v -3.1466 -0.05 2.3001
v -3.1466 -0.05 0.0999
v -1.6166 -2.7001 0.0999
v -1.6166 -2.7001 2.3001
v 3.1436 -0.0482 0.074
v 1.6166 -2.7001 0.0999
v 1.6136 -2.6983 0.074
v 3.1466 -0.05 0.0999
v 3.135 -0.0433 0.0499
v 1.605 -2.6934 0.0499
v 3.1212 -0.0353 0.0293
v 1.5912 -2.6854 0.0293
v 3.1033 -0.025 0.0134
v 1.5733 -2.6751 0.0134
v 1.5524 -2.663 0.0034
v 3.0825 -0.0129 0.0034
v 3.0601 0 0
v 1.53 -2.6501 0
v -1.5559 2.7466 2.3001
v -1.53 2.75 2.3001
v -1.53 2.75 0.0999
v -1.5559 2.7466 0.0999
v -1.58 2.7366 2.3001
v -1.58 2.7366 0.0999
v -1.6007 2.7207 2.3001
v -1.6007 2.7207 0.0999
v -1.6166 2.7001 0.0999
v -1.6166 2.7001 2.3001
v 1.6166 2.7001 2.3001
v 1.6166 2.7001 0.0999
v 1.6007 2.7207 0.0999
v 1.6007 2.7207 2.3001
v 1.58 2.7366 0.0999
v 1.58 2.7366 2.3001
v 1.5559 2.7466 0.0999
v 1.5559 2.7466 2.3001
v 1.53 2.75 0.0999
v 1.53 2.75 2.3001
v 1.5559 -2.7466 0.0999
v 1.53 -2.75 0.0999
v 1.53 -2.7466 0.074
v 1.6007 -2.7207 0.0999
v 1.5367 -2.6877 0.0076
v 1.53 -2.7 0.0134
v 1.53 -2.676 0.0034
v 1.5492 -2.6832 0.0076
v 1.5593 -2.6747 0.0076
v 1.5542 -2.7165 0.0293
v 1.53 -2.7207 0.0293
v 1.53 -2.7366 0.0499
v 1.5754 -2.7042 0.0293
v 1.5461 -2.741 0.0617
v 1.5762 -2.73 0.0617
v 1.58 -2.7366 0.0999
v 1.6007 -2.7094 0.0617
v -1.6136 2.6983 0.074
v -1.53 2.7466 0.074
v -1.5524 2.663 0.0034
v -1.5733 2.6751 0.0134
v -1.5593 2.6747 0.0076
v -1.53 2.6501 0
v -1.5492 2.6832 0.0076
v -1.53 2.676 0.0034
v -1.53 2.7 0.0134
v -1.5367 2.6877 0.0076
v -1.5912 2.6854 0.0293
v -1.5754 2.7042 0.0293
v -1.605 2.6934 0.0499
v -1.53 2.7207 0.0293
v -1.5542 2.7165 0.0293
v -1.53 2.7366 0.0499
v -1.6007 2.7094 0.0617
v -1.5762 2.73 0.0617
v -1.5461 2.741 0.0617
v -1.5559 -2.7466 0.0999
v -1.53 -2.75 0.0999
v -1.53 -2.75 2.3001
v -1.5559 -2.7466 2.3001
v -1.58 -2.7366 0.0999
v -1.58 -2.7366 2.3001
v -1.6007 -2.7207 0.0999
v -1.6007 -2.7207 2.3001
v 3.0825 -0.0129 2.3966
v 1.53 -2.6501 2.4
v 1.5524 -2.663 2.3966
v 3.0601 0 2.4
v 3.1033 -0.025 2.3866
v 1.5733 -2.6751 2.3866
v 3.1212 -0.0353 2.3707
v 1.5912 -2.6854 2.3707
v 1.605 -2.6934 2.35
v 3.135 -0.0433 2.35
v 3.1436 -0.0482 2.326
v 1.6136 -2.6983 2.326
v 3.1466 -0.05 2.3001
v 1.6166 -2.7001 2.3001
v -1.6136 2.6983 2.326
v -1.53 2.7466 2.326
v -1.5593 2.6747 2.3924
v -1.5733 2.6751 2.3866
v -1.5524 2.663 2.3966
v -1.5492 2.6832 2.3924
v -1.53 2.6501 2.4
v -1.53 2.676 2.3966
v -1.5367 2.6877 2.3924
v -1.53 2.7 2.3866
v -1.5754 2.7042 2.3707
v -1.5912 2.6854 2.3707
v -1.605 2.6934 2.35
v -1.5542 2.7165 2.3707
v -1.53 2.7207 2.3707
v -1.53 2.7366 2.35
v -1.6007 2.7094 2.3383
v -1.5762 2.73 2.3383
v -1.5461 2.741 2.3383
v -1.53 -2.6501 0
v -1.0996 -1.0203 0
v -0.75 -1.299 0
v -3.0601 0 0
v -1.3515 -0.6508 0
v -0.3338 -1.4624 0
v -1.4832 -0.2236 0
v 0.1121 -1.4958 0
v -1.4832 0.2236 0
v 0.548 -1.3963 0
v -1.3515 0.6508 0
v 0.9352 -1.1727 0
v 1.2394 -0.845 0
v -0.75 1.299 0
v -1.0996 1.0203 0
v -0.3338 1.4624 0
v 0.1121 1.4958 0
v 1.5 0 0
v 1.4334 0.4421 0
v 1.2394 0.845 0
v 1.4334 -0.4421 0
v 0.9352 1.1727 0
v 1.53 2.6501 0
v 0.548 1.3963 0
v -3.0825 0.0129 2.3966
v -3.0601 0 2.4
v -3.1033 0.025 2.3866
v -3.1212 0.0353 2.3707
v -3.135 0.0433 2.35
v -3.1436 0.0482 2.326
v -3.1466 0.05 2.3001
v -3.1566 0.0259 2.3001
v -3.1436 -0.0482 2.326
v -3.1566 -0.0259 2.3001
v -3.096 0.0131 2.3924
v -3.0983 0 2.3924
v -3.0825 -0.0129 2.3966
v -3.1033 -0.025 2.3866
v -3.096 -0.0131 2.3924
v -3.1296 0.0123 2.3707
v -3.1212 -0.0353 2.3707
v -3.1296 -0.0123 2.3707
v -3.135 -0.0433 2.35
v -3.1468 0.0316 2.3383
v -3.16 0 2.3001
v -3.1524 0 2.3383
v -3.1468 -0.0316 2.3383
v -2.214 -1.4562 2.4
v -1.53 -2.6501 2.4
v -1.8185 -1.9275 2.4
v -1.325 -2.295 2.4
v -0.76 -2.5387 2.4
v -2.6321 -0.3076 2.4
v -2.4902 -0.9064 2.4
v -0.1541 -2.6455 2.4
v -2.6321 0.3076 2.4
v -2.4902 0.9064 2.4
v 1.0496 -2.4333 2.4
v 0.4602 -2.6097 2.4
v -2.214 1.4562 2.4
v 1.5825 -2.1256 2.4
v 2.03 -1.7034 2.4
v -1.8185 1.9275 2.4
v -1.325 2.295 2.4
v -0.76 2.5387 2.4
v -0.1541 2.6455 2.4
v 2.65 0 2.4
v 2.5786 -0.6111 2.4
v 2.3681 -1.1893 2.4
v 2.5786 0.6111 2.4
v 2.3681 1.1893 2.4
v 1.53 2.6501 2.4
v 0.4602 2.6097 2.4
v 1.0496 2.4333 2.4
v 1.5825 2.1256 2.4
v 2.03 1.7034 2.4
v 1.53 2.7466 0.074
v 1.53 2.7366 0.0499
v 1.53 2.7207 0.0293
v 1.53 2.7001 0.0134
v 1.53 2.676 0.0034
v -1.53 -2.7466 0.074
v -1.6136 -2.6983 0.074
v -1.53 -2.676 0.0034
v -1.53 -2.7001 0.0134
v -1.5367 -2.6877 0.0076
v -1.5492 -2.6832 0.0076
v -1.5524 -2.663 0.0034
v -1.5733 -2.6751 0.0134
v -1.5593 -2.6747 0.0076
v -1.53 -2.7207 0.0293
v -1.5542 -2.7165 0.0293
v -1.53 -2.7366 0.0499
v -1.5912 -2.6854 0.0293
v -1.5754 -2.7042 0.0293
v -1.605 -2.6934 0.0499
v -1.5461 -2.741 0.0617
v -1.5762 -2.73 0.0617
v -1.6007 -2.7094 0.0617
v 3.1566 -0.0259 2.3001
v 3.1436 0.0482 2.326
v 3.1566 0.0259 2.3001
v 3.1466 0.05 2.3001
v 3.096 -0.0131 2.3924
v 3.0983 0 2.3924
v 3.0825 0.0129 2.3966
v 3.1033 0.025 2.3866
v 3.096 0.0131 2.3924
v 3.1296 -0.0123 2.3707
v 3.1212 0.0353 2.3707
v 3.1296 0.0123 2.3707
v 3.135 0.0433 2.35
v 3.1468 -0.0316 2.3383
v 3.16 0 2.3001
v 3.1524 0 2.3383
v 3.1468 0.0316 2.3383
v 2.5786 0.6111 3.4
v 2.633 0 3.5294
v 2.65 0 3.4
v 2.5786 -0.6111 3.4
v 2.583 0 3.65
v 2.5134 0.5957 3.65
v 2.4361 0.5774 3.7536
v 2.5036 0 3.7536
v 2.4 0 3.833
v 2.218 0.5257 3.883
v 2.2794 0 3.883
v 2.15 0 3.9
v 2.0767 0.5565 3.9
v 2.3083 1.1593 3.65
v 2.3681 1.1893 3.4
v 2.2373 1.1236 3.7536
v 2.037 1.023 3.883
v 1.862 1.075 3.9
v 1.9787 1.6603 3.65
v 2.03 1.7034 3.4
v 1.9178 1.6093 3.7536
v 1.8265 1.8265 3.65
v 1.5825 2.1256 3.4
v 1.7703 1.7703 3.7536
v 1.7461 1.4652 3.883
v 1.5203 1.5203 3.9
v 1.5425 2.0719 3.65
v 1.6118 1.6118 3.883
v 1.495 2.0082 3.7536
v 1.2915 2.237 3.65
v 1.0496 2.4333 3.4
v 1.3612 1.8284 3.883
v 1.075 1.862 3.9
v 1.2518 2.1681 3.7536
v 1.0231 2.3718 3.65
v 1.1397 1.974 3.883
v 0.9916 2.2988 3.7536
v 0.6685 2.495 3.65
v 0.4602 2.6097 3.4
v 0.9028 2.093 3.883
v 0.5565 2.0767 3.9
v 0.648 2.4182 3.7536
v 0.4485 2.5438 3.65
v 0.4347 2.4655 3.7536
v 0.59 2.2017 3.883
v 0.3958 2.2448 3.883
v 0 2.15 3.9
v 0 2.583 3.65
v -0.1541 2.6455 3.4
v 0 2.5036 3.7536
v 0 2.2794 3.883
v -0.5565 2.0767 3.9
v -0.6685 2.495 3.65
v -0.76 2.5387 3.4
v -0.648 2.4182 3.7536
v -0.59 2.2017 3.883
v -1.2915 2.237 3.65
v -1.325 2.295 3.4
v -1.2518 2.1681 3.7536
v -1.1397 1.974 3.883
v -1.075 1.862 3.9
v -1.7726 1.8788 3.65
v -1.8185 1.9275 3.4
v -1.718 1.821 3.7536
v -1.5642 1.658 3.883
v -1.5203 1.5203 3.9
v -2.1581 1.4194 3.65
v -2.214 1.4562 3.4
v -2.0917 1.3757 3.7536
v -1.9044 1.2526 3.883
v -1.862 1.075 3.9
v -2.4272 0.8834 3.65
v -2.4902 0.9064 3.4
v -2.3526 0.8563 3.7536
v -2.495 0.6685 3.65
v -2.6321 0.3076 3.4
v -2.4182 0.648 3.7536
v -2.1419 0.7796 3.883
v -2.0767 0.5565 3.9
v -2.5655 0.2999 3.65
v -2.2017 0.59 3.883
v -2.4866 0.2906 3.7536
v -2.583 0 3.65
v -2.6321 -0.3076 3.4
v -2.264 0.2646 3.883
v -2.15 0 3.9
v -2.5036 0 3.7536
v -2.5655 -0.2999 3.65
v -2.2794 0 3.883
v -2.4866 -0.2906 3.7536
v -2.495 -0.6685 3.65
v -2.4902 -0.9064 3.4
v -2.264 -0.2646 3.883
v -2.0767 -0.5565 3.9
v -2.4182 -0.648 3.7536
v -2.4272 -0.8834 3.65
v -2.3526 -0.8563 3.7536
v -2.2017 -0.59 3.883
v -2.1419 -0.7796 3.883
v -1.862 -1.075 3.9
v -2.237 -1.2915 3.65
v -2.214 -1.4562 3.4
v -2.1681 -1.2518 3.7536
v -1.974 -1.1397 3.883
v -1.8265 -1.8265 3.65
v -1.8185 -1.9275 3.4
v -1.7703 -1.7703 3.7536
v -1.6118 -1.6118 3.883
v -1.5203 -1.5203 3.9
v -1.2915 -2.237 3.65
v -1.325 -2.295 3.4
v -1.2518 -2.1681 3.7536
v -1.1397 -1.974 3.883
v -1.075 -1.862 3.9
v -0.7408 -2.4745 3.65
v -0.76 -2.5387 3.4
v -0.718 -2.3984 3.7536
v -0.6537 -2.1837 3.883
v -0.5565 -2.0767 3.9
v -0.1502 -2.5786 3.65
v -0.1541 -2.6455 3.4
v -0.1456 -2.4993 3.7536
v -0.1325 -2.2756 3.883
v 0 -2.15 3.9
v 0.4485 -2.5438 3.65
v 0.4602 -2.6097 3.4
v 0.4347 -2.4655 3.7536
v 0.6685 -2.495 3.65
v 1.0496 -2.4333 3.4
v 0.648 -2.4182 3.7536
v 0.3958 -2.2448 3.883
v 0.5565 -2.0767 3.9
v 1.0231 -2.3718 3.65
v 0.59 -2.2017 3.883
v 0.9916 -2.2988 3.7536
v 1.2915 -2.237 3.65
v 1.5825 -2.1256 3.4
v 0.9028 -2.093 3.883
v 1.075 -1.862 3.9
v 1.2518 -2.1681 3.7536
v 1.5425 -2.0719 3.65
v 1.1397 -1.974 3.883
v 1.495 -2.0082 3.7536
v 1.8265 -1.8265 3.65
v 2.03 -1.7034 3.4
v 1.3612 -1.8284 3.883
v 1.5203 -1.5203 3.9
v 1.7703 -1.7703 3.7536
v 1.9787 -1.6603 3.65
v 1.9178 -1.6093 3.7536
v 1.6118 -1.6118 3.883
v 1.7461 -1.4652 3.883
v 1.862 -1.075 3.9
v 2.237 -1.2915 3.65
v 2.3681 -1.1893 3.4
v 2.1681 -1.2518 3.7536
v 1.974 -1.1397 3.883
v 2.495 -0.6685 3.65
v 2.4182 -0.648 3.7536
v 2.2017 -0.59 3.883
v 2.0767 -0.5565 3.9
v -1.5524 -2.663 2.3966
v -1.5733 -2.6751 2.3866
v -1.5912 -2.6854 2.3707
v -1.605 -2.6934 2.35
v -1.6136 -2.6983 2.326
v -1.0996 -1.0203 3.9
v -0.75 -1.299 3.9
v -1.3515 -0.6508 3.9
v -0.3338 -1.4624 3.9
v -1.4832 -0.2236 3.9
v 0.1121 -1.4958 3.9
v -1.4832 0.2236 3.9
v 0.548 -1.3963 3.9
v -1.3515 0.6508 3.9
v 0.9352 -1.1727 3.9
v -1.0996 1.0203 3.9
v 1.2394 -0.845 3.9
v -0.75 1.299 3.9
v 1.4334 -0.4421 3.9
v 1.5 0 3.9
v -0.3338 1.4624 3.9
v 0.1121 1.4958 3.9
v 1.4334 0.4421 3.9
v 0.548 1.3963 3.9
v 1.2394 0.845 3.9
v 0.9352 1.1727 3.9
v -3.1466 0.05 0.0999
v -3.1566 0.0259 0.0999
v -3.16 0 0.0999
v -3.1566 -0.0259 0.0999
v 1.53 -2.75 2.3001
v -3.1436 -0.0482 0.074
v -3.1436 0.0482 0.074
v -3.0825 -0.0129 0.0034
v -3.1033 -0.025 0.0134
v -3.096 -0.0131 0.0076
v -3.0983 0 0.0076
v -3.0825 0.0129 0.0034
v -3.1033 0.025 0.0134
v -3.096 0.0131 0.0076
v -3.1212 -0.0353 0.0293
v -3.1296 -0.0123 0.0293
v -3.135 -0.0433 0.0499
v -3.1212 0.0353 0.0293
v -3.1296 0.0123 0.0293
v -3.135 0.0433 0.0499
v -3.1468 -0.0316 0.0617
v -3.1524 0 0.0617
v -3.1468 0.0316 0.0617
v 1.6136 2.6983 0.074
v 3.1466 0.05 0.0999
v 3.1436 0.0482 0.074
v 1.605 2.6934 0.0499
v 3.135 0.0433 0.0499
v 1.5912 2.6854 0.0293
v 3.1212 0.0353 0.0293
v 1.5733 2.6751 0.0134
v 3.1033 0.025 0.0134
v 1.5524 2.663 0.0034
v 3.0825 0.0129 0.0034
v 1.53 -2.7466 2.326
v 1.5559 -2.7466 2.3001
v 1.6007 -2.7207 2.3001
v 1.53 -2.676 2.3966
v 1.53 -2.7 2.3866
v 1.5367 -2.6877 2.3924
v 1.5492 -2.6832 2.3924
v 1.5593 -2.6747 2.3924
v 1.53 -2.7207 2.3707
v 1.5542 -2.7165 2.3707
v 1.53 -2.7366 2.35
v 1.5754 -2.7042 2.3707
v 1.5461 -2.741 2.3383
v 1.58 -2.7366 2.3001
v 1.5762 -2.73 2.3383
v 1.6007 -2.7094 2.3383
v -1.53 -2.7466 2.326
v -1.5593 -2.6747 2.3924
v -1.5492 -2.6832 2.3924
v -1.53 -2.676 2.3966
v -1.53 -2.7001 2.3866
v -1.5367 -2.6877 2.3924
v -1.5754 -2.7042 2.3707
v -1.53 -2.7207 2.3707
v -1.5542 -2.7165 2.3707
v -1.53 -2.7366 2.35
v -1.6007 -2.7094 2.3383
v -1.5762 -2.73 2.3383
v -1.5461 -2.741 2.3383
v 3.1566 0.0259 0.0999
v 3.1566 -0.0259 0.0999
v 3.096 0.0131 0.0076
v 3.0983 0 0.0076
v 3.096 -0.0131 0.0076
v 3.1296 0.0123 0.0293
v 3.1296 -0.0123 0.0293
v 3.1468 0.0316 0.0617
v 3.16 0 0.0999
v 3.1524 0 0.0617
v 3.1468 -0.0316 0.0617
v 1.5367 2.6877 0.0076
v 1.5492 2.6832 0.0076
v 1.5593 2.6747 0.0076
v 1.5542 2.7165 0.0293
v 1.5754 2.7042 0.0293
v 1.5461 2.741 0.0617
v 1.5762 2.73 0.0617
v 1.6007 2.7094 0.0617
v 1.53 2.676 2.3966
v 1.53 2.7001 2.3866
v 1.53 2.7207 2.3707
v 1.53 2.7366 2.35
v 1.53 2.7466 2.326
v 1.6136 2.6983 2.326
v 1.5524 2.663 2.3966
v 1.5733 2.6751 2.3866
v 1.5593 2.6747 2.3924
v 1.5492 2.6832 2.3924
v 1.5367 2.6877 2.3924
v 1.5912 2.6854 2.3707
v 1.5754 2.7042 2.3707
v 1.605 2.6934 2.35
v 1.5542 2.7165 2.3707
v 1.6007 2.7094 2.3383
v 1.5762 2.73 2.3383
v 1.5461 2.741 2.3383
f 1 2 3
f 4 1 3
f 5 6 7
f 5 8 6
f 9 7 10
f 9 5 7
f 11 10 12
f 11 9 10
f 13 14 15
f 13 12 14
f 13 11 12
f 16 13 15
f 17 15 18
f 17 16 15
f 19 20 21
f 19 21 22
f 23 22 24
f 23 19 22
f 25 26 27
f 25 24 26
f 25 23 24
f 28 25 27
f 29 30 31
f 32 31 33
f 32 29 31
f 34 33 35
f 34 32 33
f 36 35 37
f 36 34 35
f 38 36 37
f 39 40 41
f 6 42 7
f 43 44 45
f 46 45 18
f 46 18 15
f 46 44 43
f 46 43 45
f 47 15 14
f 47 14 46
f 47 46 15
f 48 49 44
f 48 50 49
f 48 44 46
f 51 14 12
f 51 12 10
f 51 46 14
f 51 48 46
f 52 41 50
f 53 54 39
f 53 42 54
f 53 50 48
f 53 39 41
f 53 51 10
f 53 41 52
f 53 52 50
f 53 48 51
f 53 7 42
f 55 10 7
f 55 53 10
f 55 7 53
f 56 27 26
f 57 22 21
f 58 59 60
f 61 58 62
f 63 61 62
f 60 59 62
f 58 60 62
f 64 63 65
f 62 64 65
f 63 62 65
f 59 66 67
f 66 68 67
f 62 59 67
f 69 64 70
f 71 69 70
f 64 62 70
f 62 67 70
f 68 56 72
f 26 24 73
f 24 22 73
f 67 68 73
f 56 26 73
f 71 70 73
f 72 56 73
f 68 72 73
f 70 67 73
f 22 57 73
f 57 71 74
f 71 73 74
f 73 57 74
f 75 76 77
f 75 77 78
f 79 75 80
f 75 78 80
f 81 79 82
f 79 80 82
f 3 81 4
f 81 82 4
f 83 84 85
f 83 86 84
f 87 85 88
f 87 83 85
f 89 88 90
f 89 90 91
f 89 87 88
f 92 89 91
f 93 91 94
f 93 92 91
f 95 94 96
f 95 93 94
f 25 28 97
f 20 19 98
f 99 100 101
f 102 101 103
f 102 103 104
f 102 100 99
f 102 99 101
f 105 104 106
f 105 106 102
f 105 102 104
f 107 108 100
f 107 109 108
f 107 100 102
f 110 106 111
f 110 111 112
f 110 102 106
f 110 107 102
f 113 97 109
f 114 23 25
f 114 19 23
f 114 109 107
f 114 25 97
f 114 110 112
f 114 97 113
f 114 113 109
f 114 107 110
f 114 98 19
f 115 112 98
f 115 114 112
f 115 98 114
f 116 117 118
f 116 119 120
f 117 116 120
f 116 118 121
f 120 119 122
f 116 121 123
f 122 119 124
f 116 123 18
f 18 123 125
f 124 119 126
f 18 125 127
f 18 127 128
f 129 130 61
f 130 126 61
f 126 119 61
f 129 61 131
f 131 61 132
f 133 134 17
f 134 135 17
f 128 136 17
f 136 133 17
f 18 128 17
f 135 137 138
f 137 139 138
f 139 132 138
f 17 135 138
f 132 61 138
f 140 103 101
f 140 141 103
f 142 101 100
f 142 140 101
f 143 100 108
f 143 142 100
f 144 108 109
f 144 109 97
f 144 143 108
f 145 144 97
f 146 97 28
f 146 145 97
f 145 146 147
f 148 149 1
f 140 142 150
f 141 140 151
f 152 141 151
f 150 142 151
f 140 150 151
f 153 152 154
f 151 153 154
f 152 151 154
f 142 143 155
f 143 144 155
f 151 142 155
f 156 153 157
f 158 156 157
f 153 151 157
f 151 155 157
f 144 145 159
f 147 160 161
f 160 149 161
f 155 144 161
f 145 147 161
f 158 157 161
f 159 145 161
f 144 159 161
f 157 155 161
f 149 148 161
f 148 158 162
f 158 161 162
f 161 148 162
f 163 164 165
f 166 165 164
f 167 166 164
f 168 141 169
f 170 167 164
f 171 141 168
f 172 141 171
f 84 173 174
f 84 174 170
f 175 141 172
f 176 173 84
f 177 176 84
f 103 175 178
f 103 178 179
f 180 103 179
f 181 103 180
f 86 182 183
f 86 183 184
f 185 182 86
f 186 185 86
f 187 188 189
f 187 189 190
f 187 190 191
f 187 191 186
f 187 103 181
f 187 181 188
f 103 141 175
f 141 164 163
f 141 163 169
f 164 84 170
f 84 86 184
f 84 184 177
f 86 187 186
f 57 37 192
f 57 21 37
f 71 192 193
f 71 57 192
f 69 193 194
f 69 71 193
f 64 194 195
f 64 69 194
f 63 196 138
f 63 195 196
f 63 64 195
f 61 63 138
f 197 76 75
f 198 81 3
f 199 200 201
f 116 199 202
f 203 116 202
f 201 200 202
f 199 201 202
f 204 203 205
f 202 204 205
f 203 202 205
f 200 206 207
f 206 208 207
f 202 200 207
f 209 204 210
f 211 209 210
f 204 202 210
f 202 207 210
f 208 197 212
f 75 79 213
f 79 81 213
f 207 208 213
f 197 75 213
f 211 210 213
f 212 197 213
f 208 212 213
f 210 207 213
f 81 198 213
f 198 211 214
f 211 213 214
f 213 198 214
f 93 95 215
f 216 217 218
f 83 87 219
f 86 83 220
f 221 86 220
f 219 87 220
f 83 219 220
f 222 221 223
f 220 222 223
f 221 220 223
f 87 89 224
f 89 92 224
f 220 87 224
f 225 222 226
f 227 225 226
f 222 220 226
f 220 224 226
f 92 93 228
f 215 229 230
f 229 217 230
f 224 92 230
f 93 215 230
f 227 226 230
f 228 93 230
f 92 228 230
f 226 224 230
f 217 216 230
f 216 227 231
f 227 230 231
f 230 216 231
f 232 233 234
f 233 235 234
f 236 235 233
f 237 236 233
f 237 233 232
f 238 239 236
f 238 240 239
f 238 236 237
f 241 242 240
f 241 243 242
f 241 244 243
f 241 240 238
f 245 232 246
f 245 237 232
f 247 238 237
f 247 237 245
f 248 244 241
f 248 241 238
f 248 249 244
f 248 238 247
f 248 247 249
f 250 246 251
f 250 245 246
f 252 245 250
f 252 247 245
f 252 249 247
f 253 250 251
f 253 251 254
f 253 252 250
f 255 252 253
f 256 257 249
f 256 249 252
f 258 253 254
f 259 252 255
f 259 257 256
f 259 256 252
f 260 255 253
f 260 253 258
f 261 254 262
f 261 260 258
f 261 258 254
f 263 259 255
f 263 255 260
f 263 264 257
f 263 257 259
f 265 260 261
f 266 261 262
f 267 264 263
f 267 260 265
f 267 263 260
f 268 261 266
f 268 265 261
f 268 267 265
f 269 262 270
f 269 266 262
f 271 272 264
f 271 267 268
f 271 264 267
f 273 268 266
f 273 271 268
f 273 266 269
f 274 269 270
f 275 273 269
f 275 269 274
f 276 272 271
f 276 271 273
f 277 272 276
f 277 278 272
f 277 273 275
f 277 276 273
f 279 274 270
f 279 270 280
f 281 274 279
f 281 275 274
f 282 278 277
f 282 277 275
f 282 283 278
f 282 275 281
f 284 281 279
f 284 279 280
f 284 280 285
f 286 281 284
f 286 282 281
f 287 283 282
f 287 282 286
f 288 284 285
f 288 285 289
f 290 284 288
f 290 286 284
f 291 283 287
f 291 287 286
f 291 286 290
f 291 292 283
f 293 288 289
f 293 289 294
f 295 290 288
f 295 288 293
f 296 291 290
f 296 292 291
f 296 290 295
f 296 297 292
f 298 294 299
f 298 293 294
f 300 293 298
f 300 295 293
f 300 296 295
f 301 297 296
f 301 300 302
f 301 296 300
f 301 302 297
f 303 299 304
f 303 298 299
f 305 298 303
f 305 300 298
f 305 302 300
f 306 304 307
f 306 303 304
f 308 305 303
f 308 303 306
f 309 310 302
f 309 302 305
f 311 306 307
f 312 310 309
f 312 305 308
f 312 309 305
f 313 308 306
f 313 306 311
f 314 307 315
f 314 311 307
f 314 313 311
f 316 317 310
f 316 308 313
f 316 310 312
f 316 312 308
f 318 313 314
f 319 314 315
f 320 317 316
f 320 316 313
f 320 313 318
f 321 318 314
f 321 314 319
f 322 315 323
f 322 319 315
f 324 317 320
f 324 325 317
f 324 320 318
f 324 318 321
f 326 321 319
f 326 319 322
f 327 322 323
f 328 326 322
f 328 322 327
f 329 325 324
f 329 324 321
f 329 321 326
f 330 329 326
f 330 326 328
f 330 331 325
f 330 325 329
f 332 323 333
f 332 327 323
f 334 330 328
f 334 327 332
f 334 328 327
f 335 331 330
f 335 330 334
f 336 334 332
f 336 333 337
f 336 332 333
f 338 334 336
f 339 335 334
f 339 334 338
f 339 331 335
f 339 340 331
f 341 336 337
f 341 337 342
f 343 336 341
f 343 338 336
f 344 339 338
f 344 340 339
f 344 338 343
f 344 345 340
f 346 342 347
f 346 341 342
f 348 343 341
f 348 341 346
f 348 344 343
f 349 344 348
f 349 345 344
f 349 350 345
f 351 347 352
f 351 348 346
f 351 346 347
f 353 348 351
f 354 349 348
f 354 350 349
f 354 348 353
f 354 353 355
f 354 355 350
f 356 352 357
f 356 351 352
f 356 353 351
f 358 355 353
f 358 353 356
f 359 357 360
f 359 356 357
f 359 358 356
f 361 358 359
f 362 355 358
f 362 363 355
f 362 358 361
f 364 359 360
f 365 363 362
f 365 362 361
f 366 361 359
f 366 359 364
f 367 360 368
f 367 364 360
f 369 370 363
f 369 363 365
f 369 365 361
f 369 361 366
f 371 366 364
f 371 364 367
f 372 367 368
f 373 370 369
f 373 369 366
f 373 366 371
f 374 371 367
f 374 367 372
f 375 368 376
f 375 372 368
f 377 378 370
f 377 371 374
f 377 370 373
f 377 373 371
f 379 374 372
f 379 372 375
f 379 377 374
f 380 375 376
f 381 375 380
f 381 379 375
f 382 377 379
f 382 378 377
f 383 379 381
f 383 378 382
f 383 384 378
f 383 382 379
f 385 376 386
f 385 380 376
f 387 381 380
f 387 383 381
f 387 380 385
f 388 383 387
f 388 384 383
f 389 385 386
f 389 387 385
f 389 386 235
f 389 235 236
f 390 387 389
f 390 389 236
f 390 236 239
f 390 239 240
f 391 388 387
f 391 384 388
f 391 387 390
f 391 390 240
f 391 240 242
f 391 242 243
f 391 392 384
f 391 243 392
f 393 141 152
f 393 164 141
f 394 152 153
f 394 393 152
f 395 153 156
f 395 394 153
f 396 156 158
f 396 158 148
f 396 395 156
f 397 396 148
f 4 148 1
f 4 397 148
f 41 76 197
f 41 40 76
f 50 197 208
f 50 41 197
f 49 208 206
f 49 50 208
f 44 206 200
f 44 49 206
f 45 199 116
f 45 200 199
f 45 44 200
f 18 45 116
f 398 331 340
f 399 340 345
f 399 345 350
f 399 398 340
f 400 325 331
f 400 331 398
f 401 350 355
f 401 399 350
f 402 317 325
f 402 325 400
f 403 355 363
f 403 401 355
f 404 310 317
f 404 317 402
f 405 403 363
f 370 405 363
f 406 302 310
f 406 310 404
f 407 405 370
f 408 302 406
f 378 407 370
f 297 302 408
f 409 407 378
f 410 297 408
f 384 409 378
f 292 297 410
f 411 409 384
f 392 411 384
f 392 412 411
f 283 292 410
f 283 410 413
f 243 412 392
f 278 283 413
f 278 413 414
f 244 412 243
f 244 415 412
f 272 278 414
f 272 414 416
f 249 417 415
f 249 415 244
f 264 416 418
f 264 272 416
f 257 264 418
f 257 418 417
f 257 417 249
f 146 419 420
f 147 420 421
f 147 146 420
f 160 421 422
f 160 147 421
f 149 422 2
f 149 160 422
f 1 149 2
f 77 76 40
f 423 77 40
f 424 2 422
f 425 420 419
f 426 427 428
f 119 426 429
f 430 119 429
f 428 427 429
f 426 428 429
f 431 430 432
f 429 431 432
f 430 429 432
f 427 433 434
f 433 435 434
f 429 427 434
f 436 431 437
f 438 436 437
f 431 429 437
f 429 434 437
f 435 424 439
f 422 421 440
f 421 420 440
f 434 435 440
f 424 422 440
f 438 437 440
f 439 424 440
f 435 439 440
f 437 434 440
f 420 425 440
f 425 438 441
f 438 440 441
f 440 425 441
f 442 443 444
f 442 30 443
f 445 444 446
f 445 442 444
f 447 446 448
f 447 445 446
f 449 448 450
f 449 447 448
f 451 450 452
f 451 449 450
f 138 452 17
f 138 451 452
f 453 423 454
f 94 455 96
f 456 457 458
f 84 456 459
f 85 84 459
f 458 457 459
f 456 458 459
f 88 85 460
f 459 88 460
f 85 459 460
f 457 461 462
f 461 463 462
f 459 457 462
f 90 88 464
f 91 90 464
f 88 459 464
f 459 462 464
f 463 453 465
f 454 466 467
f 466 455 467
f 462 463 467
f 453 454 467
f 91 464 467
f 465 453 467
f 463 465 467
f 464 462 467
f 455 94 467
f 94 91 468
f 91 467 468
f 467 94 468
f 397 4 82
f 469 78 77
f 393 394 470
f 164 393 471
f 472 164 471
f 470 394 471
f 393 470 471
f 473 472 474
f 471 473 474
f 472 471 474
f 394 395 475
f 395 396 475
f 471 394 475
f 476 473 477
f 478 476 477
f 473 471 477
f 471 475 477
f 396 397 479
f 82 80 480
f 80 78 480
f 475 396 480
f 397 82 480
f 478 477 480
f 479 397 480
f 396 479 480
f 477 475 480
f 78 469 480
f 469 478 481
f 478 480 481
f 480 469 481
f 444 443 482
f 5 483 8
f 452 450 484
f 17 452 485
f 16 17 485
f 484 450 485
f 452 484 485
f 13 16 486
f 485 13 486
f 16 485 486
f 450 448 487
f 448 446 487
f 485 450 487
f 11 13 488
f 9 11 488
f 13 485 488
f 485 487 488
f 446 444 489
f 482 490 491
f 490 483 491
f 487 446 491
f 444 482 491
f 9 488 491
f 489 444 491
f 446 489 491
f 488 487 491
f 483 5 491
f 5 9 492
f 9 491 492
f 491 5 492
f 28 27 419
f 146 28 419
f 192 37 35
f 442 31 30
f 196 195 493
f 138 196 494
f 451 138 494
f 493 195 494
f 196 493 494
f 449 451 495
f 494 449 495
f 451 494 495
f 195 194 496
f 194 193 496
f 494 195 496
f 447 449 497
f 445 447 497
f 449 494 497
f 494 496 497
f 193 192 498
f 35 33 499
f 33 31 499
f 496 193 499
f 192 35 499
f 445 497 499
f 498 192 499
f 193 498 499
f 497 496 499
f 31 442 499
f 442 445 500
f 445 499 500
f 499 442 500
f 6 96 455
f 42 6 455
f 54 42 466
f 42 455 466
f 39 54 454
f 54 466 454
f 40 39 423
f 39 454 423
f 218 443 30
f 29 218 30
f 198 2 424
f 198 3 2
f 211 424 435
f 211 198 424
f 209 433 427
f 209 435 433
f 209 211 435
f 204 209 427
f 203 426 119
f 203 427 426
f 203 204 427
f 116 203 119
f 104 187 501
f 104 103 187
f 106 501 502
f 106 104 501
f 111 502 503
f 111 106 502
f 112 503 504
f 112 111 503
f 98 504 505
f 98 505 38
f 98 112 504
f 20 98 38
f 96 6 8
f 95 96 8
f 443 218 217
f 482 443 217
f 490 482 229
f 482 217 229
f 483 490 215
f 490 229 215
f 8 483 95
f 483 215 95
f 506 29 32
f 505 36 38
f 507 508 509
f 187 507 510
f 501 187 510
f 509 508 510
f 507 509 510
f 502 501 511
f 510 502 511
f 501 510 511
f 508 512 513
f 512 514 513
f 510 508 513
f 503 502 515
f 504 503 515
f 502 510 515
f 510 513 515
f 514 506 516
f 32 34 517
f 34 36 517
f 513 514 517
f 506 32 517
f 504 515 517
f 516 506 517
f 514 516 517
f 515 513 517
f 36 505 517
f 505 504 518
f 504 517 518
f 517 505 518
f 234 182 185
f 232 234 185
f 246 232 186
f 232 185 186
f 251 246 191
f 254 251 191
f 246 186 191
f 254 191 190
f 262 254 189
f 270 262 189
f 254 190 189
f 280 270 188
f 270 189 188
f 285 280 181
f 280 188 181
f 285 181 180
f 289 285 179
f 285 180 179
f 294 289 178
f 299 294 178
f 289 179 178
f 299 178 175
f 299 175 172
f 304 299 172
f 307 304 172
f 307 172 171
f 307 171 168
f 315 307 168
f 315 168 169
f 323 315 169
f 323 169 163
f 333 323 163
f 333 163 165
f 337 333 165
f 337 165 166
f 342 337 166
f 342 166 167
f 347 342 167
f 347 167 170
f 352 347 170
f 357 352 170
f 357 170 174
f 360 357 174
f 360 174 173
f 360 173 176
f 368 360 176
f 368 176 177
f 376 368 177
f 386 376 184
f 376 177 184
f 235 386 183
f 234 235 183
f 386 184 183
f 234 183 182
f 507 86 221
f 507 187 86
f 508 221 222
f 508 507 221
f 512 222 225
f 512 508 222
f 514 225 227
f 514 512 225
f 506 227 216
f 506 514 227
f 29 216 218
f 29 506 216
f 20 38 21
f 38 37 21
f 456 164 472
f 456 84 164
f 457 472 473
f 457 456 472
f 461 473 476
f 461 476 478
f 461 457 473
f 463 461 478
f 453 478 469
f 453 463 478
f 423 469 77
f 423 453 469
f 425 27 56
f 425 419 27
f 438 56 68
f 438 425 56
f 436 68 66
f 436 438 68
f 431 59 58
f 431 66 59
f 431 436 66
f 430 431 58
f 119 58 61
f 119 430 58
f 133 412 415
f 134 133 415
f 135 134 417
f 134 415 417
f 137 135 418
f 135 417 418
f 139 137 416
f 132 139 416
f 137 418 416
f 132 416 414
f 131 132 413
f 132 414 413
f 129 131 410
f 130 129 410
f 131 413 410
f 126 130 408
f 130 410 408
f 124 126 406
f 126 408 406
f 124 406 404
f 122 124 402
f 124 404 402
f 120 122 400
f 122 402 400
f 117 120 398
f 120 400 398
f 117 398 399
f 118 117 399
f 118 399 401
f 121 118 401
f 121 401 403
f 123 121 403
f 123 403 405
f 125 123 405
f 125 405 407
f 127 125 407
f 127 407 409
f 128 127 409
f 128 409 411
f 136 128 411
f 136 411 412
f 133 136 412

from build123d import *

# Parameters (mm, degrees)
EXTRUDE_1_DEPTH     = 2.4
EXTRUDE_START       = -2.4
SKETCH_2_R          = 2.65
EXTRUDE_2_DEPTH     = 3.9
FILLET_1_R          = 0.5
FILLET_2_R          = 0.1
SKETCH_3_R          = 1.5
CUT_EXTRUDE_1_DEPTH = 6.723453712


with BuildPart() as part:
    # 草图1 → 凸台-拉伸1 (new body)
    with BuildSketch(Plane.XY):
        Polygon((3.175426481, 0), (1.58771324, 2.75), (-1.58771324, 2.75), (-3.175426481, 0), (-1.58771324, -2.75), (1.58771324, -2.75), align=None)
    extrude(amount=EXTRUDE_1_DEPTH)

    # 草图2 → 凸台-拉伸2 (add)
    with BuildSketch(Plane.XY.offset(2.4).offset(EXTRUDE_START)):
        Circle(SKETCH_2_R)
    extrude(amount=EXTRUDE_2_DEPTH)

    # 圆角1
    fillet_1_edges = [part.edges().sort_by_distance(p)[0] for p in [
        (-2.65, 0, 3.9),
    ]]
    fillet(fillet_1_edges, radius=FILLET_1_R)

    # 圆角2
    fillet_2_edges = [part.edges().sort_by_distance(p)[0] for p in [
        (0, 2.75, 2.4),
        (1.58771324, -2.75, 1.2),
        (-1.58771324, -2.75, 1.2),
        (-3.175426481, 0, 1.2),
        (-1.58771324, 2.75, 1.2),
        (1.58771324, 2.75, 1.2),
        (3.175426481, 0, 1.2),
        (-2.38156986, 1.375, 2.4),
        (-2.38156986, -1.375, 2.4),
        (0, -2.75, 2.4),
        (2.38156986, -1.375, 2.4),
        (0, -2.75, 0),
        (-2.38156986, -1.375, 0),
        (-2.38156986, 1.375, 0),
        (2.38156986, 1.375, 2.4),
        (0, 2.75, 0),
        (2.38156986, 1.375, 0),
        (2.38156986, -1.375, 0),
    ]]
    fillet(fillet_2_edges, radius=FILLET_2_R - 0.0001)  # a hair under: the kernel refuses the full size

    # 草图3 → 切除-拉伸1 (cut, through all)
    with BuildSketch(Plane.XY.offset(3.9)):
        Circle(SKETCH_3_R)
    extrude(amount=-CUT_EXTRUDE_1_DEPTH, mode=Mode.SUBTRACT)


solid = part.part
